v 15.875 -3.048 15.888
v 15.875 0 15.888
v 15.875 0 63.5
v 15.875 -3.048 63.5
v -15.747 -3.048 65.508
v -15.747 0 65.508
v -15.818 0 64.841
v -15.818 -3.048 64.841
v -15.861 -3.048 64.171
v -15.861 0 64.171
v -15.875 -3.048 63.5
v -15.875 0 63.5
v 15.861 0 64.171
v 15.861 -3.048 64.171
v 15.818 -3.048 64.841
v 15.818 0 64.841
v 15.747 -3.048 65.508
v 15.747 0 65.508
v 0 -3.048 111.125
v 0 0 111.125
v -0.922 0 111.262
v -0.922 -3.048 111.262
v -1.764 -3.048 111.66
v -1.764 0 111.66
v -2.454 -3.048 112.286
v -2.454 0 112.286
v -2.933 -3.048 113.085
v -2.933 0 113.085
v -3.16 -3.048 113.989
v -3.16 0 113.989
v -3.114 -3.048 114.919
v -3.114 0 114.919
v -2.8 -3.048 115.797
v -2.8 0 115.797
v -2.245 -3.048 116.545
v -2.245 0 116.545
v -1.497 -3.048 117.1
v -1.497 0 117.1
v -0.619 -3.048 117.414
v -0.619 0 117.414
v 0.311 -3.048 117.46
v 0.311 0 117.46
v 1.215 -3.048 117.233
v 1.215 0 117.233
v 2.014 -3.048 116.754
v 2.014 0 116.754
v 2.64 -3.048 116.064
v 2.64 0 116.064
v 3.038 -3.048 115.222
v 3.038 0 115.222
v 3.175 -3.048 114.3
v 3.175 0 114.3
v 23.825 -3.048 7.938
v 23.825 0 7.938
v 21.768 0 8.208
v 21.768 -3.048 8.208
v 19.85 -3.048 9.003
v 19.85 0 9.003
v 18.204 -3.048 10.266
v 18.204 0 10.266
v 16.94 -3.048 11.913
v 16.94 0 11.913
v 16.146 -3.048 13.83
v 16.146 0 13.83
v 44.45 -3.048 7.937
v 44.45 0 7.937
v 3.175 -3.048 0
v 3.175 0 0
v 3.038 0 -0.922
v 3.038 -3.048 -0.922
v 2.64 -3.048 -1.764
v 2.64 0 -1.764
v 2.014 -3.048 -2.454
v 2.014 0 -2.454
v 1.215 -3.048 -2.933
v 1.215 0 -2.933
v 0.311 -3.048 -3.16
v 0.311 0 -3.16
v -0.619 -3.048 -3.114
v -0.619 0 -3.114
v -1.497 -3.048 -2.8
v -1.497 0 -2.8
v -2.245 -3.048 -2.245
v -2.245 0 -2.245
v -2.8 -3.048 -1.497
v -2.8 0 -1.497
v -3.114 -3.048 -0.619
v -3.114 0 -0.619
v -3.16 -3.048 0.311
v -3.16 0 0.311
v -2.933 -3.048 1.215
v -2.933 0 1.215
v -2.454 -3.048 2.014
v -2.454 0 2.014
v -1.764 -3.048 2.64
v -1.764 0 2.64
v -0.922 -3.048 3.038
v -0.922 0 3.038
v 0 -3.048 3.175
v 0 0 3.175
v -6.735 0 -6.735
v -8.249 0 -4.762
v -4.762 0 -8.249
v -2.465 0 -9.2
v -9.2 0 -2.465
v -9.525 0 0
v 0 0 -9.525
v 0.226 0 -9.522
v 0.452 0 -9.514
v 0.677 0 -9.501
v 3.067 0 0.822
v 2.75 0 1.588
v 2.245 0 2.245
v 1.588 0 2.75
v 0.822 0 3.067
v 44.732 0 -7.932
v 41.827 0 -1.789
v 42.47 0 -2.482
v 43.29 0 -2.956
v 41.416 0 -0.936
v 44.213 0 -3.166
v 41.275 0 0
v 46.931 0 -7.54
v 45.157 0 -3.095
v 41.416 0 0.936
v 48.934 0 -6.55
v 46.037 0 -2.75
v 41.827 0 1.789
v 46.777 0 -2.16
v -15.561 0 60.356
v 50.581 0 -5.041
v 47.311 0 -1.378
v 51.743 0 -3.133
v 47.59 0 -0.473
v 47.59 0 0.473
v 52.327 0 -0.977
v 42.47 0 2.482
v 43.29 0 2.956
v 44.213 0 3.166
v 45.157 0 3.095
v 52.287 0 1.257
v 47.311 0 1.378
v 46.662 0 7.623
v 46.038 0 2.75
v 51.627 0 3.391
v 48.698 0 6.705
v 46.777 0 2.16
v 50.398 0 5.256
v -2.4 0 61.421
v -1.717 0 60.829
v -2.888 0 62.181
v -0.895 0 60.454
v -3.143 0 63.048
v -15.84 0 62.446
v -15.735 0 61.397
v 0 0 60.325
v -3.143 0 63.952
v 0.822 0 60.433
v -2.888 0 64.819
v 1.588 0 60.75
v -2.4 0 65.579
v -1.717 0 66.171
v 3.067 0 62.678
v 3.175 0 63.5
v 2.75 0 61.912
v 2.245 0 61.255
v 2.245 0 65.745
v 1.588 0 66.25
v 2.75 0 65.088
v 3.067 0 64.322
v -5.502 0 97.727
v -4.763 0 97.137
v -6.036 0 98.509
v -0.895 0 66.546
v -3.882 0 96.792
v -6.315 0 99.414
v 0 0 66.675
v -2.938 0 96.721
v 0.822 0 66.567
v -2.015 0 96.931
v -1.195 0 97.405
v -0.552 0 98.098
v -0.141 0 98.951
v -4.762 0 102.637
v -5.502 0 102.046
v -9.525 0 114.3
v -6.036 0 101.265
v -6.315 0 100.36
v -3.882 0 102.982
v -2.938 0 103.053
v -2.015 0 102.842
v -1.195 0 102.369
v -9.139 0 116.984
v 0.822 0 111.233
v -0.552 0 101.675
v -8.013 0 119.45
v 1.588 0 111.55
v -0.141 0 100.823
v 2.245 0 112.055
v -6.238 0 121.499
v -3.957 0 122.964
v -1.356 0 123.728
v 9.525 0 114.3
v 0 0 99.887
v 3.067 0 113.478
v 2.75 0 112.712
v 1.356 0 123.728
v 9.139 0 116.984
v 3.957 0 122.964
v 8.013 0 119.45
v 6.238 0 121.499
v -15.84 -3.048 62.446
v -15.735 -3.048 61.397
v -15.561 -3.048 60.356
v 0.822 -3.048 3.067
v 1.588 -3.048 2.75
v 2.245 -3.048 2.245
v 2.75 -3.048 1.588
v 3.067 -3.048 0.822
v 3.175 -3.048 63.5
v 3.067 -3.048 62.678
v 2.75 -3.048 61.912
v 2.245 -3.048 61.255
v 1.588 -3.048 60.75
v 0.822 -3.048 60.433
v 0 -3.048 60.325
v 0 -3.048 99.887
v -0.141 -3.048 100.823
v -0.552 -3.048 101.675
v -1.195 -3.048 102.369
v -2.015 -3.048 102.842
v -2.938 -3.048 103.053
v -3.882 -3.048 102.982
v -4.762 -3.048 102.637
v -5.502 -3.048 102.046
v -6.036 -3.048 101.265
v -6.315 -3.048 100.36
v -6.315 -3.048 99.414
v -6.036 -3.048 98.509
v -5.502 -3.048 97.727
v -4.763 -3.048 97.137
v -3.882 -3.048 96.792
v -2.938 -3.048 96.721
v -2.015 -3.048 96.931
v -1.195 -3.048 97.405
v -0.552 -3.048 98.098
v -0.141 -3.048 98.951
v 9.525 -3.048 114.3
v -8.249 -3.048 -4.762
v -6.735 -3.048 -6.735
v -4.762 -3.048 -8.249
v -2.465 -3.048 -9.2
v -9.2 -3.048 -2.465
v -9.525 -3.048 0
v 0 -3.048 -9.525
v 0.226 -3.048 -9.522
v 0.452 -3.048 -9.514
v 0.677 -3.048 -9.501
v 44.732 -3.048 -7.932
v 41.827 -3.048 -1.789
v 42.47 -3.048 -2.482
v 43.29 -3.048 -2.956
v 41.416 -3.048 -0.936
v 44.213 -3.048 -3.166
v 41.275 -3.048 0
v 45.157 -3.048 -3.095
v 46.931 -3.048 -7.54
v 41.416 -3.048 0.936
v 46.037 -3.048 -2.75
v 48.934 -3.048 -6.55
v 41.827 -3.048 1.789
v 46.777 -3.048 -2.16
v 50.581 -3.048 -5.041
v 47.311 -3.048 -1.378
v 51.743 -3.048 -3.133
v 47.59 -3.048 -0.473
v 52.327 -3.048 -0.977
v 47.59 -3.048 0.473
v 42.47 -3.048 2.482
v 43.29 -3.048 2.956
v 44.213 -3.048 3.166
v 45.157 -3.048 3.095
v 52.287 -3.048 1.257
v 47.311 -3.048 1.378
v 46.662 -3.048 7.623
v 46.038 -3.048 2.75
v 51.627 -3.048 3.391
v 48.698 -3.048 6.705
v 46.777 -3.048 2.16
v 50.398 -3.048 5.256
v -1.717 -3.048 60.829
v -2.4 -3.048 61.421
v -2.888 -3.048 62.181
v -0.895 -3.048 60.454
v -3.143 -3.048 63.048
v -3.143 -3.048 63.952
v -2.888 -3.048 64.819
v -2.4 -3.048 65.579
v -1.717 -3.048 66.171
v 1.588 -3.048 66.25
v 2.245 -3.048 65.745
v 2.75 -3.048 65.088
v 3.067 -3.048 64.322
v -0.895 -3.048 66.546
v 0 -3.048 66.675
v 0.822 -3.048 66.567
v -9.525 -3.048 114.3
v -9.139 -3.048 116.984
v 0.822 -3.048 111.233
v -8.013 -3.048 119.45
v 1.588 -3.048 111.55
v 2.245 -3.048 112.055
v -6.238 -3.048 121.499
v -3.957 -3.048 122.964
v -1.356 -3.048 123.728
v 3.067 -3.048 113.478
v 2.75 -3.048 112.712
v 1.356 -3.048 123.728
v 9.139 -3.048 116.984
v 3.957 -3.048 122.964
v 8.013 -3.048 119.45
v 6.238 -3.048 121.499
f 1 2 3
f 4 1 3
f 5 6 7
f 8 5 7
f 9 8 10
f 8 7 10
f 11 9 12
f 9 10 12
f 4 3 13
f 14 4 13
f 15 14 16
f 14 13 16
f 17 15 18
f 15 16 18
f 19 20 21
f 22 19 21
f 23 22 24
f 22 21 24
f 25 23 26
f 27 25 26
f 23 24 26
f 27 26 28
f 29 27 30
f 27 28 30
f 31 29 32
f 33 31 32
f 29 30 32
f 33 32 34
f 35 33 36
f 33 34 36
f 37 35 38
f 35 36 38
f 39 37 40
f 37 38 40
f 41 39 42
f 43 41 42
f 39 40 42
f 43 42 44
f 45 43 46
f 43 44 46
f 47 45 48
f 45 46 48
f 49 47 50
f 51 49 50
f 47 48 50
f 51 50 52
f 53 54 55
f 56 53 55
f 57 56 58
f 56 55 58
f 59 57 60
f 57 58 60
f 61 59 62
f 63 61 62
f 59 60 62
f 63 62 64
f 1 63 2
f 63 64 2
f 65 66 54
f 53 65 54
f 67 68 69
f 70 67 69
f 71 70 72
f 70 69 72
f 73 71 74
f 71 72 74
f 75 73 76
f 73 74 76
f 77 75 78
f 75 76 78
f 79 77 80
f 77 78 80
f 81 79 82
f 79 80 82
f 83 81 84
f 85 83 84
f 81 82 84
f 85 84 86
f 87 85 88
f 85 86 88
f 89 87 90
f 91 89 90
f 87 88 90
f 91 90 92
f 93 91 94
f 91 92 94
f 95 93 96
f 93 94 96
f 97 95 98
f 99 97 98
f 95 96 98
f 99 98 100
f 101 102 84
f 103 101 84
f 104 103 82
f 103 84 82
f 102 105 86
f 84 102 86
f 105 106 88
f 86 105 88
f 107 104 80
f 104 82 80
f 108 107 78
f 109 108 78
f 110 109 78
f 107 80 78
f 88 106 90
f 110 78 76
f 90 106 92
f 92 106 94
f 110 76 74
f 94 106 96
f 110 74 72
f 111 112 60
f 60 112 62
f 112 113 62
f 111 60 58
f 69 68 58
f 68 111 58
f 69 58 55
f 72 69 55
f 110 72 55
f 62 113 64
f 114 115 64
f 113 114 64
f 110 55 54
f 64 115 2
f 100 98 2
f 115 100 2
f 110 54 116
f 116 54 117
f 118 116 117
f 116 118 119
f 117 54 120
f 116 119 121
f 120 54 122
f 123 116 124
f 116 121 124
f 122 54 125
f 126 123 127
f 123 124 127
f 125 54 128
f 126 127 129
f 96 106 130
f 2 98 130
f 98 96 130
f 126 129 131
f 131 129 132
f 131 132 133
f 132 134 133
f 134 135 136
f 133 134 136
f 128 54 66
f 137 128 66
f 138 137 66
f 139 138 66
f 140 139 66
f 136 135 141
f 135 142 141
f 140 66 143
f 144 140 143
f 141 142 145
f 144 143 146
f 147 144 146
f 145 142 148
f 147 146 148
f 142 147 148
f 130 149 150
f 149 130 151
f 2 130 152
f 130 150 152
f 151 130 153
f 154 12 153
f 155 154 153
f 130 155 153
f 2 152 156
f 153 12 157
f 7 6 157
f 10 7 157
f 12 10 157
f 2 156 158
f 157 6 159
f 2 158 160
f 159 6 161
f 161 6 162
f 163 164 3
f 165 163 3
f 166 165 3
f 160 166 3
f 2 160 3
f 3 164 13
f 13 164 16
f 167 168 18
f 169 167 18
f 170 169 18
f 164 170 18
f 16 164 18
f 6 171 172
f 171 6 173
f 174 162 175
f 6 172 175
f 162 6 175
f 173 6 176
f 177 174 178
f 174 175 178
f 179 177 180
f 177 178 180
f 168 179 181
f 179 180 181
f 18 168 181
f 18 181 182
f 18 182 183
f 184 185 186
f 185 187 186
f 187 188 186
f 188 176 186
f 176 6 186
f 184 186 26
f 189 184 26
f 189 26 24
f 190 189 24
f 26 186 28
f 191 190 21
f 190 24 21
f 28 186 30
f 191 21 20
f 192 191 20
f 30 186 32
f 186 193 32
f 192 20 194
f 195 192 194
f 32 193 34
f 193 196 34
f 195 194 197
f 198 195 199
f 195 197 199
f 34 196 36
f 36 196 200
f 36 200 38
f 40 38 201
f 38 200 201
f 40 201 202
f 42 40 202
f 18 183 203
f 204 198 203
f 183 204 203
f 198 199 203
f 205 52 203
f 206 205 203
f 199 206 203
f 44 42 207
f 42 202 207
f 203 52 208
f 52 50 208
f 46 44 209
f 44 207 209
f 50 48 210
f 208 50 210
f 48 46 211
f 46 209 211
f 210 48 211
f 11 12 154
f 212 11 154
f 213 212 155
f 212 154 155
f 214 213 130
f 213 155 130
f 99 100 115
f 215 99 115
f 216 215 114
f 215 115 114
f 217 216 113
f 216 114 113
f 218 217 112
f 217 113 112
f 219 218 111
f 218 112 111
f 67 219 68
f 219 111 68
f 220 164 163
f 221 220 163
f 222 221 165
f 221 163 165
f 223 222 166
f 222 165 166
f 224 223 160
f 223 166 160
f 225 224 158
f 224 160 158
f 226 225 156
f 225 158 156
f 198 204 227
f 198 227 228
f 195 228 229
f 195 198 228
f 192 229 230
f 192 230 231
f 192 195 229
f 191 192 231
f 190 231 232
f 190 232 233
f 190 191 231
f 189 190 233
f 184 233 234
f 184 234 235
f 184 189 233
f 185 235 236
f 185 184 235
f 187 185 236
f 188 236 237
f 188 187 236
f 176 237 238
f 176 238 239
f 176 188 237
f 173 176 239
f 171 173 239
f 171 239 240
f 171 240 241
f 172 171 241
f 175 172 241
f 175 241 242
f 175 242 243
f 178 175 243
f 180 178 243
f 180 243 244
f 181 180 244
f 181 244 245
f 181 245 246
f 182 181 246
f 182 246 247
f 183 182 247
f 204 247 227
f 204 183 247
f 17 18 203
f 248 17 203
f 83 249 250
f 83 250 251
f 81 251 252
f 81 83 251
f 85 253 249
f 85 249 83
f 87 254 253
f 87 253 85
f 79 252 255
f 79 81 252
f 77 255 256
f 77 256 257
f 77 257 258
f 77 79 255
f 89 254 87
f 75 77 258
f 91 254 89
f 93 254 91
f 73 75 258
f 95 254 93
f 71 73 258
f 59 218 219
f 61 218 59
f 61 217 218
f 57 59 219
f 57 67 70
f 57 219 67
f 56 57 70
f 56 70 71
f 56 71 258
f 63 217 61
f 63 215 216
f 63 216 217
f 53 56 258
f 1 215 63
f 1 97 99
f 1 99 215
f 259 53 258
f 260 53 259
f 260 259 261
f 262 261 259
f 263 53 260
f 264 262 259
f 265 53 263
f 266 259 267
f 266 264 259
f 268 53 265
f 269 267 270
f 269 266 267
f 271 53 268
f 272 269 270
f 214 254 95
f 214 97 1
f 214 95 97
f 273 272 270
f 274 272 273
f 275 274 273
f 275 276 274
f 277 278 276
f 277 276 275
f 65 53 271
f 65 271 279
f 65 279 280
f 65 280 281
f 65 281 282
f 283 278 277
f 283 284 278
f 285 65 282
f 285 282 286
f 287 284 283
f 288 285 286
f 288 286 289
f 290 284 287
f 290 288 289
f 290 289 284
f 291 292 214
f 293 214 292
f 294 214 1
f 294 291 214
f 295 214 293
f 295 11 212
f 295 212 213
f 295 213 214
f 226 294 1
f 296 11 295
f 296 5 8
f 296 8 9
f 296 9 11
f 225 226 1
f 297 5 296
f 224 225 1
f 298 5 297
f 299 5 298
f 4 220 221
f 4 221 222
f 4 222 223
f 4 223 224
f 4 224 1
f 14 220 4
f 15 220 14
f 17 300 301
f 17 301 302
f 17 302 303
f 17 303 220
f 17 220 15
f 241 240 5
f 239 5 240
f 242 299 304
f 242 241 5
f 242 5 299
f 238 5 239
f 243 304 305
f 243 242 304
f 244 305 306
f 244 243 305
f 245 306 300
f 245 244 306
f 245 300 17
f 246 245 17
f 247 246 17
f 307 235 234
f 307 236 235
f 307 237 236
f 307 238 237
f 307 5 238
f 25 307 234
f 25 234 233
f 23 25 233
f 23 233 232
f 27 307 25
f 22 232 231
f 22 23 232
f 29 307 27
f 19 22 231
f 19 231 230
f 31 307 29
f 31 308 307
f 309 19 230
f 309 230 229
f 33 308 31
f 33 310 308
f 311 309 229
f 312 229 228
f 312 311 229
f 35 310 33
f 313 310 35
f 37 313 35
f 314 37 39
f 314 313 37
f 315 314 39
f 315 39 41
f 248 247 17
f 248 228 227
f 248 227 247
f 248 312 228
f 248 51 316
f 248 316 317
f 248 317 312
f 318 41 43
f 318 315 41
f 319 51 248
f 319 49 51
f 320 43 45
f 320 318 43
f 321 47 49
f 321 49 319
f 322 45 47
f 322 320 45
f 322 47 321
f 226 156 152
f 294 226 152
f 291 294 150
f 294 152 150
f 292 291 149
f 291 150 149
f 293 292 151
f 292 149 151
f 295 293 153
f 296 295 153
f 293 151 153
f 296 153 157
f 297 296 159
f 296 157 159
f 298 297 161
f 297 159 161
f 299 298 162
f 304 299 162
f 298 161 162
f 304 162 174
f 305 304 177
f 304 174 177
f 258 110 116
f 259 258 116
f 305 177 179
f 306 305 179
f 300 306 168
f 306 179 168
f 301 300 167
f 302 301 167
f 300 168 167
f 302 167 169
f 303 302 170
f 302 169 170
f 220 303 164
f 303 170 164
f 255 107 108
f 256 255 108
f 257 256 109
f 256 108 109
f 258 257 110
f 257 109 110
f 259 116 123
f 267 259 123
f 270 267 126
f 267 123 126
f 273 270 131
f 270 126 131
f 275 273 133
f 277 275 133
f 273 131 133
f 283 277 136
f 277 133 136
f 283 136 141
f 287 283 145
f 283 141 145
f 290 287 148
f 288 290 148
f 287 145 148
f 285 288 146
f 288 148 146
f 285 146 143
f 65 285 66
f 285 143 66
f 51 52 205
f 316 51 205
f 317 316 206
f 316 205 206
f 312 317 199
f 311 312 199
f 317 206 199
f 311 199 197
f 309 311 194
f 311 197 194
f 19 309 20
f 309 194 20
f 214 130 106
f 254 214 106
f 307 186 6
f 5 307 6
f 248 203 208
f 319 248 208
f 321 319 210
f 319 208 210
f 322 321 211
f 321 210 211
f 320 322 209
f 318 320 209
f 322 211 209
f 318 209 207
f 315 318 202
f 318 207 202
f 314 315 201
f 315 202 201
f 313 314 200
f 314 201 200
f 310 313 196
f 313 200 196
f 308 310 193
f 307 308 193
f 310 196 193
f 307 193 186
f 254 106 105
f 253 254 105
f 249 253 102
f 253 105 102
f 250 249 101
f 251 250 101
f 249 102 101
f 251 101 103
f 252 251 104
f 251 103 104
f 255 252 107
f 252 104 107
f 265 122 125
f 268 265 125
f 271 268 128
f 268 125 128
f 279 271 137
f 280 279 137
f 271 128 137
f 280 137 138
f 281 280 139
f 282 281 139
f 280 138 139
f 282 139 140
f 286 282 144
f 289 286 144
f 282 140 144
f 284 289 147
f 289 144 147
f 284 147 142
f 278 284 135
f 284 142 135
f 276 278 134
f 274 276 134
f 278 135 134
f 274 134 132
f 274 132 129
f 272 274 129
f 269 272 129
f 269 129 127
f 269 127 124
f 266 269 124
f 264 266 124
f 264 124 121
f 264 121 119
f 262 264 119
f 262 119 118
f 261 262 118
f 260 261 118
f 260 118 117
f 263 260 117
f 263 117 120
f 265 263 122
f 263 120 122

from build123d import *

# Parameters (mm, degrees)
F0_R     = 3.175
F1_DEPTH = 3.048


with BuildPart() as f1:
    # F0 (on Front) → F1 (new body)
    with BuildSketch(Plane.XZ):
        with BuildLine():
            ThreePointArc((3.175, 0), (-2.2450640303, -2.2450640303), (0, 3.175))
            Line((0, 3.175), (0, 9.525))
            ThreePointArc((0, 9.525), (-6.7351920908, 6.7351920908), (-9.525, 0))
            ThreePointArc((-9.525, 0), (-6.7351920908, -6.7351920908), (0, -9.525))
            Line((0, -9.525), (0.6773435479, -9.500885786))
            ThreePointArc((0.6773435479, -9.500885786), (6.9705567315, -6.4912990883), (9.525, 0))
            Line((9.525, 0), (3.175, 0))
        make_face()
        with BuildLine():
            ThreePointArc((-9.525, 0), (-6.7351920908, 6.7351920908), (0, 9.525))
            Line((0, 9.525), (0, 47.625))
            ThreePointArc((0, 47.625), (-10.0526499203, 51.2134278751), (-15.5606435644, 60.3564356436))
            Line((-15.5606435644, 60.3564356436), (-9.525, 0))
        make_face()
        with BuildLine():
            Line((0, 47.625), (0, 9.525))
            ThreePointArc((0, 9.525), (6.7351920908, 6.7351920908), (9.525, 0))
            Line((9.525, 0), (36.5125, 0))
            ThreePointArc((36.5125, 0), (38.8373399243, 5.6126600757), (44.45, 7.9375))
            Line((44.45, 7.9375), (23.8252, 7.9375))
            ThreePointArc((23.8252, 7.9375), (18.2035596682, 10.2660596682), (15.875, 15.8877))
            Line((15.875, 15.8877), (15.875, 63.5))
            ThreePointArc((15.875, 63.5), (11.2253201513, 52.2746798487), (0, 47.625))
        make_face()
        with BuildLine():
            Line((36.5125, 0), (9.525, 0))
            ThreePointArc((9.525, 0), (6.9705567315, -6.4912990883), (0.6773435479, -9.500885786))
            Line((0.6773435479, -9.500885786), (44.7324052746, -7.9324746146))
            ThreePointArc((44.7324052746, -7.9324746146), (38.9380895153, -5.7116327839), (36.5125, 0))
        make_face()
        with BuildLine():
            ThreePointArc((-15.5606435644, 60.3564356436), (-10.0526499203, 51.2134278751), (0, 47.625))
            Line((0, 47.625), (0, 60.325))
            ThreePointArc((0, 60.325), (-3.175, 63.5), (0, 66.675))
            Line((0, 66.675), (0, 79.375))
            ThreePointArc((0, 79.375), (-10.4912828548, 75.4142187767), (-15.7474569047, 65.5082893304))
            ThreePointArc((-15.7474569047, 65.5082893304), (-15.8430821396, 64.5061676396), (-15.875, 63.5))
            Line((-15.875, 63.5), (-15.5606435644, 60.3564356436))
        make_face()
        with BuildLine():
            Line((0, 60.325), (0, 47.625))
            ThreePointArc((0, 47.625), (11.2253201513, 52.2746798487), (15.875, 63.5))
            ThreePointArc((15.875, 63.5), (15.8430821396, 64.5061676396), (15.7474569047, 65.5082893304))
            ThreePointArc((15.7474569047, 65.5082893304), (10.4912828548, 75.4142187767), (0, 79.375))
            Line((0, 79.375), (0, 66.675))
            ThreePointArc((0, 66.675), (2.2450640303, 65.7450640303), (3.175, 63.5))
            ThreePointArc((3.175, 63.5), (2.2450640303, 61.2549359697), (0, 60.325))
        make_face()
        with BuildLine():
            ThreePointArc((44.45, 7.9375), (38.8373399243, 5.6126600757), (36.5125, 0))
            ThreePointArc((36.5125, 0), (38.9380895153, -5.7116327839), (44.7324052746, -7.9324746146))
            ThreePointArc((44.7324052746, -7.9324746146), (50.1616327839, -5.5119104847), (52.3875, 0))
            ThreePointArc((52.3875, 0), (50.0626600757, 5.6126600757), (44.45, 7.9375))
        make_face()
        with BuildLine():
            ThreePointArc((47.625, 0), (44.45, -3.175), (41.275, 0))
            ThreePointArc((41.275, 0), (44.45, 3.175), (47.625, 0))
        make_face(mode=Mode.SUBTRACT)
        with BuildLine():
            ThreePointArc((0, -9.525), (0.3388863295, -9.5189695375), (0.6773435479, -9.500885786))
            Line((0.6773435479, -9.500885786), (0, -9.525))
        make_face()
        with BuildLine():
            ThreePointArc((-15.875, 63.5), (-15.7962153946, 61.9203784605), (-15.5606435644, 60.3564356436))
            Line((-15.5606435644, 60.3564356436), (-15.875, 63.5))
        make_face()
        with BuildLine():
            ThreePointArc((0, 79.375), (10.4912828548, 75.4142187767), (15.7474569047, 65.5082893304))
            Line((15.7474569047, 65.5082893304), (9.525, 114.3))
            ThreePointArc((9.525, 114.3), (6.7351920908, 107.5648079092), (0, 104.775))
            Line((0, 104.775), (0, 99.886942851))
            Line((0, 99.886942851), (0, 79.375))
        make_face()
        with BuildLine():
            ThreePointArc((-15.7474569047, 65.5082893304), (-10.4912828548, 75.4142187767), (0, 79.375))
            Line((0, 79.375), (0, 99.886942851))
            Line((0, 99.886942851), (0, 104.775))
            ThreePointArc((0, 104.775), (-6.7351920908, 107.5648079092), (-9.525, 114.3))
            Line((-9.525, 114.3), (-15.7474569047, 65.5082893304))
        make_face()
        with Locations((-3.175, 99.886942851)):
            Circle(F0_R, mode=Mode.SUBTRACT)
        with BuildLine():
            ThreePointArc((0, 104.775), (6.7351920908, 107.5648079092), (9.525, 114.3))
            ThreePointArc((9.525, 114.3), (0, 123.825), (-9.525, 114.3))
            ThreePointArc((-9.525, 114.3), (-6.7351920908, 107.5648079092), (0, 104.775))
        make_face()
        with BuildLine():
            ThreePointArc((3.175, 114.3), (2.2450640303, 112.0549359697), (0, 111.125))
            ThreePointArc((0, 111.125), (-2.2450640303, 116.5450640303), (3.175, 114.3))
        make_face(mode=Mode.SUBTRACT)
        with BuildLine():
            Line((0, 9.525), (0, 3.175))
            ThreePointArc((0, 3.175), (2.2450640303, 2.2450640303), (3.175, 0))
            Line((3.175, 0), (9.525, 0))
            ThreePointArc((9.525, 0), (6.7351920908, 6.7351920908), (0, 9.525))
        make_face()
    extrude(amount=F1_DEPTH)


solid = f1.part
